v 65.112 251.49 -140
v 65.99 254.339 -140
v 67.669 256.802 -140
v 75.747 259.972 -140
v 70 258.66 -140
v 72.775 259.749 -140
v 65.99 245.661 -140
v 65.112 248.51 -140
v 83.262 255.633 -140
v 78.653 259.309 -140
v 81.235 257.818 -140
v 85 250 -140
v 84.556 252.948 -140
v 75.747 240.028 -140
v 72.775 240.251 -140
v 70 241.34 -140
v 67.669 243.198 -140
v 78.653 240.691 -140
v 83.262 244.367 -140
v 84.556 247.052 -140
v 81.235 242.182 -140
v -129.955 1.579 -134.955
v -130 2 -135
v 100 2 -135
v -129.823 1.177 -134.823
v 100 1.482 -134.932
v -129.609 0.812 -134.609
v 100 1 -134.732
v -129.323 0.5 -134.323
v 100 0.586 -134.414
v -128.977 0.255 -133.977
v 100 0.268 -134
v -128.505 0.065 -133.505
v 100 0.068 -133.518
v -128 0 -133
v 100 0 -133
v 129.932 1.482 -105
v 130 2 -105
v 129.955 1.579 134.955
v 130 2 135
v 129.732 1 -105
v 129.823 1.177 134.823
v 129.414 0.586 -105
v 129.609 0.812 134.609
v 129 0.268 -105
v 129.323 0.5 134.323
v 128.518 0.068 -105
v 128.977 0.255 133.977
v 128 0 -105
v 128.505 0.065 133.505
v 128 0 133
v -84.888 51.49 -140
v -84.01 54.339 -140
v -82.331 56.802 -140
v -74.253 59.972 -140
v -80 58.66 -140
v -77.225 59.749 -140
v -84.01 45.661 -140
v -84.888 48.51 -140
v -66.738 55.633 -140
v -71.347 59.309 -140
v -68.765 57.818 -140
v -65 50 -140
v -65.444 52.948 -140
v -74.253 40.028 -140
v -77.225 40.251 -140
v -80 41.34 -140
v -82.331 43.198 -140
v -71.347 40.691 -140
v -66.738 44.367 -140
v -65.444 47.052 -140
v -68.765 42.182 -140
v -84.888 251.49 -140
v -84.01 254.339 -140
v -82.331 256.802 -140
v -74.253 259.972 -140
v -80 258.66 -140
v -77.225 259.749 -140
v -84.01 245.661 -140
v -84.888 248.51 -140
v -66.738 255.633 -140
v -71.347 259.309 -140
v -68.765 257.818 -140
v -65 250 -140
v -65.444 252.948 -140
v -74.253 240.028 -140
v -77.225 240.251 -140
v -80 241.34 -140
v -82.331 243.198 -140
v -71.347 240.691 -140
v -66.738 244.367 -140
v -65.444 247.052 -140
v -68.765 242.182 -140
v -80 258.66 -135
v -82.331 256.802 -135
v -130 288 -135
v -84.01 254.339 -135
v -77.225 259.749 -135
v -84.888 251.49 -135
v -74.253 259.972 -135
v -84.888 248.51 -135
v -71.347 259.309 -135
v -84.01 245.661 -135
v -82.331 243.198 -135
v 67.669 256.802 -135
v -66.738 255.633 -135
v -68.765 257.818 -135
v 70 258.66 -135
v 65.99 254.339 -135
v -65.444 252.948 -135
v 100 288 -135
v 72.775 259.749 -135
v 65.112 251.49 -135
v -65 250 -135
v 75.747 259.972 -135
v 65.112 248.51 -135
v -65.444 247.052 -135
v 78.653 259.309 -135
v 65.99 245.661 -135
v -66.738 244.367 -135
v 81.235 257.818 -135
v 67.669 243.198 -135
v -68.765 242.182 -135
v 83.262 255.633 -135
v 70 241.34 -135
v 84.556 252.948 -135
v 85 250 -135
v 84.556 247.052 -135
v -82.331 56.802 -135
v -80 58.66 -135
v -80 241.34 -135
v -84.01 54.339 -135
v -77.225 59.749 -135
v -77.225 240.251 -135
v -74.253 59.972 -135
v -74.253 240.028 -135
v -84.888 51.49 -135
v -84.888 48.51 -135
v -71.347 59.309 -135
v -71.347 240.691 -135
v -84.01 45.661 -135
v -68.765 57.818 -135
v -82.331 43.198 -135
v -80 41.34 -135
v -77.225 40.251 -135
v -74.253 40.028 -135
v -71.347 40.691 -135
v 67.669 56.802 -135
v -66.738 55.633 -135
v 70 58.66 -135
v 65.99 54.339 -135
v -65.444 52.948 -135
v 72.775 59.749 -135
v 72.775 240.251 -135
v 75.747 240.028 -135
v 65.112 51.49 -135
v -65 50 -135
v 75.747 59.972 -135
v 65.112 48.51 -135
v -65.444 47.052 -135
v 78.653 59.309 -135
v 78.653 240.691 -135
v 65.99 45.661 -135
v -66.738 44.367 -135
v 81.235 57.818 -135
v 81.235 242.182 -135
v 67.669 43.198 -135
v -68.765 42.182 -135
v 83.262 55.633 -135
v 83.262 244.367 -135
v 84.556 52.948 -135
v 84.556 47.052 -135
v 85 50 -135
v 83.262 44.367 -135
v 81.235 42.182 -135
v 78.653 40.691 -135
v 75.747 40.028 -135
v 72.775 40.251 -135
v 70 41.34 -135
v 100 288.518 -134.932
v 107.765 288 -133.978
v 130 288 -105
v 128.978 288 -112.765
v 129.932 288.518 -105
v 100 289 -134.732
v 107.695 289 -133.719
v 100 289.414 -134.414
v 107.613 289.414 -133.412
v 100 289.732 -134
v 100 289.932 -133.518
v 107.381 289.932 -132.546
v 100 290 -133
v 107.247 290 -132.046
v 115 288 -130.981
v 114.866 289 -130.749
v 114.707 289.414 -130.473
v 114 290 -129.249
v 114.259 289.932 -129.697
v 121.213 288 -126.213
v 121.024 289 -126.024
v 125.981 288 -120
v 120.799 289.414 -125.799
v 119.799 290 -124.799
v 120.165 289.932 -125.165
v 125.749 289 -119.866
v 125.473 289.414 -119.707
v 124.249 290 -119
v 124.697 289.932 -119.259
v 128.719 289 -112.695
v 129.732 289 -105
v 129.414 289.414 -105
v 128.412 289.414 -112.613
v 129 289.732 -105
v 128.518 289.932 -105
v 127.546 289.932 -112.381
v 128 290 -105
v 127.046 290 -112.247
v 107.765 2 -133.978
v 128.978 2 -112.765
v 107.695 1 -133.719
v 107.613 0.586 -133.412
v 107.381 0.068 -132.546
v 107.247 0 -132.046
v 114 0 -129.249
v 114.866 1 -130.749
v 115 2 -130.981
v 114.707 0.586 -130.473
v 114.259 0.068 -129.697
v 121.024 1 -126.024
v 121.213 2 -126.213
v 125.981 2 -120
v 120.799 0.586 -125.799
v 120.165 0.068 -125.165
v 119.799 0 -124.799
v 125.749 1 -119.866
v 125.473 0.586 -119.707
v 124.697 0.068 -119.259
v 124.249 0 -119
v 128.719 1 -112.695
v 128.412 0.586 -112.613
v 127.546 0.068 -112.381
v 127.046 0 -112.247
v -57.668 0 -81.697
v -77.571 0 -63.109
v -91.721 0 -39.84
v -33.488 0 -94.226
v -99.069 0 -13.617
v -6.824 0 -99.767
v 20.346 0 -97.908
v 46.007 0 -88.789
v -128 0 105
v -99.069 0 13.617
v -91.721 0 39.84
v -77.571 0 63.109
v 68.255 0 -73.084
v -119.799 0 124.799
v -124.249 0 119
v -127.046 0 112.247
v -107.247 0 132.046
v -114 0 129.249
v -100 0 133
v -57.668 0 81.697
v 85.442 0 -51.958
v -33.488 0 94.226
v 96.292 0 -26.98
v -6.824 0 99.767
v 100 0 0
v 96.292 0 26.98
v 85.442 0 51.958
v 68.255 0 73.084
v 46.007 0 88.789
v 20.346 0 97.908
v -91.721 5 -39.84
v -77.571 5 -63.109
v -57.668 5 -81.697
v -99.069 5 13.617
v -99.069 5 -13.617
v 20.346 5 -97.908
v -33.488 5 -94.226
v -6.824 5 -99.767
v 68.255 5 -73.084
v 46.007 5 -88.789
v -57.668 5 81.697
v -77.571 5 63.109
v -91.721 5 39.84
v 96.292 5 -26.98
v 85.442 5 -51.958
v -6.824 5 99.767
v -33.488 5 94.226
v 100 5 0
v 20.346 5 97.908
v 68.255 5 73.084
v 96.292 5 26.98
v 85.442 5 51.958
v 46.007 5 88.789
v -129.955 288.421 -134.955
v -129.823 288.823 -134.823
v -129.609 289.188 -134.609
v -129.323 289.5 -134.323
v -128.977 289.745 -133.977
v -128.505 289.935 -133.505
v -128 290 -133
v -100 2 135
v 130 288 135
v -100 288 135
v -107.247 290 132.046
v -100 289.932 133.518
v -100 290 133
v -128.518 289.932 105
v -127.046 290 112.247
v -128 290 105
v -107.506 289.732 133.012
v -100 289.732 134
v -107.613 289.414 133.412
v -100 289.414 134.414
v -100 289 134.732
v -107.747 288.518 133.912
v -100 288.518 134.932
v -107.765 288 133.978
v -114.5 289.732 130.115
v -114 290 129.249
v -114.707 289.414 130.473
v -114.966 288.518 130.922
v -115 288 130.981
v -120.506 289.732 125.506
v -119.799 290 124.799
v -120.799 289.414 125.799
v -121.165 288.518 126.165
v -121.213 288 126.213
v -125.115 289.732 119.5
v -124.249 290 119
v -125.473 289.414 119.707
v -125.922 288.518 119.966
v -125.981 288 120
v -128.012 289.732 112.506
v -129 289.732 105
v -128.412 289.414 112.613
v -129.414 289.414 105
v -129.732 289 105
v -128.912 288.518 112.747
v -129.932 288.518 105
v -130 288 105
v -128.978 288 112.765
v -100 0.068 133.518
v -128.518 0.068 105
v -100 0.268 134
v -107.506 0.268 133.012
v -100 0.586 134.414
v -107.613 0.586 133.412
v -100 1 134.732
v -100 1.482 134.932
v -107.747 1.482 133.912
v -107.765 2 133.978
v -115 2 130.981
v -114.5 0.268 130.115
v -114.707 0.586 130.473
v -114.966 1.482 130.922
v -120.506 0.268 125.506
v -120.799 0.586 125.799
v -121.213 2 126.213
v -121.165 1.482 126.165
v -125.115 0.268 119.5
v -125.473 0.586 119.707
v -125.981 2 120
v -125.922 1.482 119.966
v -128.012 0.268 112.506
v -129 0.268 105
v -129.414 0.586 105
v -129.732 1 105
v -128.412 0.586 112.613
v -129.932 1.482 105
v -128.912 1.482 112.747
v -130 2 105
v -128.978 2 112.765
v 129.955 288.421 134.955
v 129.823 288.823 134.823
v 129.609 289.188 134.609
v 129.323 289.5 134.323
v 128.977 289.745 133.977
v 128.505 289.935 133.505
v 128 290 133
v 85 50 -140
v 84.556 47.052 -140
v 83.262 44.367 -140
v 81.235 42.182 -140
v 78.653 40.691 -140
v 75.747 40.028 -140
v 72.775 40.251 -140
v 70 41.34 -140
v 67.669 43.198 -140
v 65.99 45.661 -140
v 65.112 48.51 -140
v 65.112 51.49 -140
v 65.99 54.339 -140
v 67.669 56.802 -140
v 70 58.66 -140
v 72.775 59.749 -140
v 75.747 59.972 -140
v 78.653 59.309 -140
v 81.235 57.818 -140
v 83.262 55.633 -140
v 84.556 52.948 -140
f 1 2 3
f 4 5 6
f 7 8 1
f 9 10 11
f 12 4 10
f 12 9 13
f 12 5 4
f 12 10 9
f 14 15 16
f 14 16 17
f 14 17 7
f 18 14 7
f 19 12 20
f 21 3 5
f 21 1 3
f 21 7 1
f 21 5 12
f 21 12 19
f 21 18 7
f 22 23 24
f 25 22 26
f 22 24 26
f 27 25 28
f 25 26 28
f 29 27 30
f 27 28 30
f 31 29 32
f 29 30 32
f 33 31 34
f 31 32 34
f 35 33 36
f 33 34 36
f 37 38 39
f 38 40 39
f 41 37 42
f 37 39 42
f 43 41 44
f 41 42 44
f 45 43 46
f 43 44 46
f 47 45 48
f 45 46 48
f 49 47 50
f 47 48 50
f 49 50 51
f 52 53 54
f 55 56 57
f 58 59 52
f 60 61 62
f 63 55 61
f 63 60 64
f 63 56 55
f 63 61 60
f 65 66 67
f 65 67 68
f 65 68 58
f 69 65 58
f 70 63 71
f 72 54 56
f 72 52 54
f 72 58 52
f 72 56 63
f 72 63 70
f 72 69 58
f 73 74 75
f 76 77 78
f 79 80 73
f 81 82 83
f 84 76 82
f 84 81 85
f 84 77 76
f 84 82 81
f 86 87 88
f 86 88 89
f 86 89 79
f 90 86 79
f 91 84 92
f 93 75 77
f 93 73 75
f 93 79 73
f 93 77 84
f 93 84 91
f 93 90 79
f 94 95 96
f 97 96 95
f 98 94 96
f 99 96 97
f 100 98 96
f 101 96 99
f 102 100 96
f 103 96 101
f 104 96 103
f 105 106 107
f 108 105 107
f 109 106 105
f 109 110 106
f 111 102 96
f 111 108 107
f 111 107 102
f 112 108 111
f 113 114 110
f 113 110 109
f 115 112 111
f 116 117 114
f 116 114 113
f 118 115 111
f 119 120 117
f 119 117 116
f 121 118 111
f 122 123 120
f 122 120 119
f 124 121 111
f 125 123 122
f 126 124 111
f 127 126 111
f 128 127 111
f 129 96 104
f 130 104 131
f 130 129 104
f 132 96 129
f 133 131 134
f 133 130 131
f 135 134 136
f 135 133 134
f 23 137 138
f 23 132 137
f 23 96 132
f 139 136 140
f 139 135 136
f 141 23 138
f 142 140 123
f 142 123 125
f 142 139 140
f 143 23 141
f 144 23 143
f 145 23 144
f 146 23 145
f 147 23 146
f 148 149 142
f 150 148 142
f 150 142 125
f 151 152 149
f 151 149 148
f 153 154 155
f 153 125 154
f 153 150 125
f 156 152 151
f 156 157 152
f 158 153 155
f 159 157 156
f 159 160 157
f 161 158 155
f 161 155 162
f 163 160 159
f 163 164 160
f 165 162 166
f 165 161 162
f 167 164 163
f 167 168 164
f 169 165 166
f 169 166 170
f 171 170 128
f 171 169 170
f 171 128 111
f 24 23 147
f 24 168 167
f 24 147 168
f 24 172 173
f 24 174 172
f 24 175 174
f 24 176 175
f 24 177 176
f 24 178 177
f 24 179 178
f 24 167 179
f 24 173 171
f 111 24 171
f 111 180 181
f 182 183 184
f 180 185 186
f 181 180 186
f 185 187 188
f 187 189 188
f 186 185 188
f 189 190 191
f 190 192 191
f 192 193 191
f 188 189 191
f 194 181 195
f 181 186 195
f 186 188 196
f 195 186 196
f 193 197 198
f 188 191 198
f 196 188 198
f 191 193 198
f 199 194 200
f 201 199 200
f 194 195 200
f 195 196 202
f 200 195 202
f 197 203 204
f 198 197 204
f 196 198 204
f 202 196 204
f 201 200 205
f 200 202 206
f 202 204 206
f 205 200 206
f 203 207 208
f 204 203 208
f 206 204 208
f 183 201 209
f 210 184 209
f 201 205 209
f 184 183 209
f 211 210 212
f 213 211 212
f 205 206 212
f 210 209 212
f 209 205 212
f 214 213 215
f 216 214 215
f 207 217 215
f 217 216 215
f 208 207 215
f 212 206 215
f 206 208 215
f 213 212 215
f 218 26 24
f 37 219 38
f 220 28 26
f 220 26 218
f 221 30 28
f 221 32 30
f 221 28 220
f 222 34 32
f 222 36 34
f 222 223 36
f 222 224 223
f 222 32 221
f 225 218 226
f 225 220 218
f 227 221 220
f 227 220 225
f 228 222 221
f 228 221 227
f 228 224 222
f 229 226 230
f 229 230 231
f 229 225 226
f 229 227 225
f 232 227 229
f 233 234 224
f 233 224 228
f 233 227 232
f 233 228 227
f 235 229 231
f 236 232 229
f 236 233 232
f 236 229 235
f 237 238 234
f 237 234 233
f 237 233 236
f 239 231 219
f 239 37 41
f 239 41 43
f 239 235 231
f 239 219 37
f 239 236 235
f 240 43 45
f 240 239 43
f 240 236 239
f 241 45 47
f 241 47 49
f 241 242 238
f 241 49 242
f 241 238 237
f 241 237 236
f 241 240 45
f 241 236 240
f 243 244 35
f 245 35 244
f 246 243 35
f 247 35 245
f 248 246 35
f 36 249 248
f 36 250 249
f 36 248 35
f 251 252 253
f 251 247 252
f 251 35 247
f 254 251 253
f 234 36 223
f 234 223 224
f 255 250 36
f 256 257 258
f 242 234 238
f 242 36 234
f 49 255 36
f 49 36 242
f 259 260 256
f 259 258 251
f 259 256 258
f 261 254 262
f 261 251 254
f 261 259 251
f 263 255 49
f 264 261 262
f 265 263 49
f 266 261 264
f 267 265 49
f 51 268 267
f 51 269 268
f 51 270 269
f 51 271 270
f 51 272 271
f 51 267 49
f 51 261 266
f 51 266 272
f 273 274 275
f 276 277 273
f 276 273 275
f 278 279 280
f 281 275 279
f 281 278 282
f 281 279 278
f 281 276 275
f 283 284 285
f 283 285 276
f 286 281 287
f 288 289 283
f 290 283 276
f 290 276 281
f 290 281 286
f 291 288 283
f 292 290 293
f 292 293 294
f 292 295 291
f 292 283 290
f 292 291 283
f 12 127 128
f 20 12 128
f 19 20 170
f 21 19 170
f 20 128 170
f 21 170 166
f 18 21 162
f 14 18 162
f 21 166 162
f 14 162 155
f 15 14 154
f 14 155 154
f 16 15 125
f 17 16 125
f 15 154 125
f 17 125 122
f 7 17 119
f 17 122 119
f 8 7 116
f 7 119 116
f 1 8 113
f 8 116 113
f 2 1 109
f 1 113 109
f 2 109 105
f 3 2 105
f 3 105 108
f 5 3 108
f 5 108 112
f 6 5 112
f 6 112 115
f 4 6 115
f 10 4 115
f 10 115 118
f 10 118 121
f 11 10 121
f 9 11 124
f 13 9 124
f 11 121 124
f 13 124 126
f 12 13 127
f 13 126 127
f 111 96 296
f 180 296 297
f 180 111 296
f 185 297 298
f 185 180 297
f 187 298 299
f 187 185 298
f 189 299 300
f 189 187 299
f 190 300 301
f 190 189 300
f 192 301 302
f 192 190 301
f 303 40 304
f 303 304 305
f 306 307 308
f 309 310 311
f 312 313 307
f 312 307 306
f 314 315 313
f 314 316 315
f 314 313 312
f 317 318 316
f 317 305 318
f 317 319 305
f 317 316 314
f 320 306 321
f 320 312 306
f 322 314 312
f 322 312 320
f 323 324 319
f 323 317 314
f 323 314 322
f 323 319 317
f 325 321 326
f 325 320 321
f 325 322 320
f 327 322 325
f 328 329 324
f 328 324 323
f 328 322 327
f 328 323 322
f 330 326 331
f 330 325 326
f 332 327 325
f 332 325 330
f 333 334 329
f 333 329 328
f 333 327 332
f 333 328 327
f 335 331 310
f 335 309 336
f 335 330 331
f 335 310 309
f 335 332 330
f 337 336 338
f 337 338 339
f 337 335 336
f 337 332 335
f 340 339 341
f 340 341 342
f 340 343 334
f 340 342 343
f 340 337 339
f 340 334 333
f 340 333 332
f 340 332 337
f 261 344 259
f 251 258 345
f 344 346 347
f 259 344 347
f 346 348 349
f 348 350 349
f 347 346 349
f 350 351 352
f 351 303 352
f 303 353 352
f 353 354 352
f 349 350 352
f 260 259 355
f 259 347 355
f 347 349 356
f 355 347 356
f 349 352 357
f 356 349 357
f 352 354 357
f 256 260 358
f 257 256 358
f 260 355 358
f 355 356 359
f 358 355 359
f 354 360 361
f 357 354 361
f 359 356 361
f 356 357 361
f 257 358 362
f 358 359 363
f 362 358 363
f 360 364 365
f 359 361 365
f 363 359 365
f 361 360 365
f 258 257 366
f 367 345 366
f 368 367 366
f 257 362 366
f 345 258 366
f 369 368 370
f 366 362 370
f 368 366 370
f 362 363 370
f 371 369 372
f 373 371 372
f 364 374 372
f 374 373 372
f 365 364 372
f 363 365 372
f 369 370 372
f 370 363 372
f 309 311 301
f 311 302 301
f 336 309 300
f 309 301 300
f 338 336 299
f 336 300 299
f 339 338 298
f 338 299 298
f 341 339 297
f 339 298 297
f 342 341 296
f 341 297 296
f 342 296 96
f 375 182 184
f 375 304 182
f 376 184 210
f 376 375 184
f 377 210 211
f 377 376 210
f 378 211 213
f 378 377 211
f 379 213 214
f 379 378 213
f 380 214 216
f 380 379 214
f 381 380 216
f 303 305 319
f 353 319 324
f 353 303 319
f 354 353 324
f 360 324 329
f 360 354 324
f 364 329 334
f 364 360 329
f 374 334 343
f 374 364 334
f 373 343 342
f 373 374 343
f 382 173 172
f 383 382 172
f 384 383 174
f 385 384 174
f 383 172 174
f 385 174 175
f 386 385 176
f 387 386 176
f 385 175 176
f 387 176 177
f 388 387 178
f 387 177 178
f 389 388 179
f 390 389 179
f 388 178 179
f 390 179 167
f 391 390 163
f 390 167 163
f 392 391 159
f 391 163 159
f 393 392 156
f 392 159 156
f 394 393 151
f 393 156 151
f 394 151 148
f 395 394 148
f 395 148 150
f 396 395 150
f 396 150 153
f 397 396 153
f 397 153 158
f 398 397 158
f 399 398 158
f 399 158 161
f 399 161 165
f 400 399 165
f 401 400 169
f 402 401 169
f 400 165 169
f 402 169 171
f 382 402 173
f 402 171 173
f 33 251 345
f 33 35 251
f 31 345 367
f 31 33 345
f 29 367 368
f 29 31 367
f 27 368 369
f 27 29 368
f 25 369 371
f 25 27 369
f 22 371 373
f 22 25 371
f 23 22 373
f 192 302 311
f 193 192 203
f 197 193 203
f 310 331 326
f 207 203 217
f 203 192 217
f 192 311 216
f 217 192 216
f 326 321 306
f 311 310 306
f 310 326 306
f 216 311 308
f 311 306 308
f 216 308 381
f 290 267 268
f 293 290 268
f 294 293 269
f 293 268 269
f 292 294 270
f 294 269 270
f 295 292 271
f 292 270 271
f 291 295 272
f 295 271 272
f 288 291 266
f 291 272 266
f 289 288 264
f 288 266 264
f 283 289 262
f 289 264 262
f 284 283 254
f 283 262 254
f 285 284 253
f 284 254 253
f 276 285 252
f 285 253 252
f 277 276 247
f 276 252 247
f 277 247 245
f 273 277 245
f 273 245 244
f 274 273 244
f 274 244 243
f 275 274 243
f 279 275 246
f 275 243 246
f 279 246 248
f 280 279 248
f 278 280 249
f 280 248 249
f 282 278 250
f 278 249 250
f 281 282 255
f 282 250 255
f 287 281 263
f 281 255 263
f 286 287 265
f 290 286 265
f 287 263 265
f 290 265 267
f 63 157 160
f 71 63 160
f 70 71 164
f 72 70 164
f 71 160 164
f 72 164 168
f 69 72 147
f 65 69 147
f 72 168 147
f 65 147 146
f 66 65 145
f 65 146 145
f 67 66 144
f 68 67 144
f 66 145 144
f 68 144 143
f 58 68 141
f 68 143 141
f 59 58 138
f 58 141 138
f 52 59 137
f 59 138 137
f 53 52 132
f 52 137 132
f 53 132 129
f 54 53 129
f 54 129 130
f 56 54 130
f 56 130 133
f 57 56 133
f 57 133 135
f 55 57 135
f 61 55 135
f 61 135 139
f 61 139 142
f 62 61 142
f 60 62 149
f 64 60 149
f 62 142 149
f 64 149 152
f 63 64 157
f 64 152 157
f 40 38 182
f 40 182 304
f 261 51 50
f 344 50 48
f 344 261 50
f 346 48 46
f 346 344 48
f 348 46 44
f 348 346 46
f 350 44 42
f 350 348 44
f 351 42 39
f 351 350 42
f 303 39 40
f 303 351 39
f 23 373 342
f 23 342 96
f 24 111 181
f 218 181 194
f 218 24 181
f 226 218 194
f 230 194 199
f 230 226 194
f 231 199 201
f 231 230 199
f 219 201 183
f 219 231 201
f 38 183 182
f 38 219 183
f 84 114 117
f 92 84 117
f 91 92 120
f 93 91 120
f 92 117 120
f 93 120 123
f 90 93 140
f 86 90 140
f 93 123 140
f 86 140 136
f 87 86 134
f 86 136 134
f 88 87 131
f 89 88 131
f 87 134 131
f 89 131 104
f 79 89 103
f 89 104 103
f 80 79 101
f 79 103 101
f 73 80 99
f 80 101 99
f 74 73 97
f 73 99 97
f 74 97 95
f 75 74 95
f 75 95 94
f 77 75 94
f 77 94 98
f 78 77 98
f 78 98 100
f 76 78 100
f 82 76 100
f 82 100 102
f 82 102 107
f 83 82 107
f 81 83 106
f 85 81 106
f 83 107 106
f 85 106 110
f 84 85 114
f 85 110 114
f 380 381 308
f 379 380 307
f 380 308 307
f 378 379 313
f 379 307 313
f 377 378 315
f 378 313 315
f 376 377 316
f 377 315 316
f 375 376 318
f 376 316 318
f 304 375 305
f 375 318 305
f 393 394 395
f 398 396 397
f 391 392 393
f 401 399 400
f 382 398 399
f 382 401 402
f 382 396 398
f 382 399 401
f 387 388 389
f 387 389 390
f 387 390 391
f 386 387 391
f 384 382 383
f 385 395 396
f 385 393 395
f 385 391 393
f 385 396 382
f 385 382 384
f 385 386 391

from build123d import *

# Parameters (mm, degrees)
F1_DEPTH = 290
F2_R     = 10
F3_DEPTH = 5
F4_R     = 2
F5_R     = 100
F6_DEPTH = 5


with BuildPart() as f1:
    # F0 (on Front) → F1 (new body)
    with BuildSketch(Plane.XZ):
        with BuildLine():
            Line((-130, -135), (100, -135))
            ThreePointArc((100, -135), (121.213203, -126.213203), (130, -105))
            Line((130, -105), (130, 135))
            Line((130, 135), (-100, 135))
            ThreePointArc((-100, 135), (-121.213203, 126.213203), (-130, 105))
            Line((-130, 105), (-130, -135))
        make_face()
    extrude(amount=-F1_DEPTH)

    # F2 (on face) → F3 (join)
    with BuildSketch(Plane(origin=(0, 0, -135), x_dir=(1, 0, 0), z_dir=(0, 0, -1))):
        with Locations((-75, -50)):
            Circle(F2_R)
        with Locations((75, -50)):
            Circle(F2_R)
        with Locations((75, -250)):
            Circle(F2_R)
        with Locations((-75, -250)):
            Circle(F2_R)
    extrude(amount=F3_DEPTH)

    # F4
    f4_edges = [f1.edges().sort_by_distance(p)[0] for p in [
        (-15, 0, -135),
        (121.213203, 0, -126.213203),
        (130, 0, 15),
        (15, 0, 135),
        (-121.213203, 0, 126.213203),
        (-130, 0, -15),
        (-15, 290, -135),
        (121.213203, 290, -126.213203),
        (130, 290, 15),
        (15, 290, 135),
        (-121.213203, 290, 126.213203),
        (-130, 290, -15),
    ]]
    fillet(f4_edges, radius=F4_R)

    # F5 (on face) → F6 (cut)
    with BuildSketch(Plane.XZ):
        Circle(F5_R)
    extrude(amount=-F6_DEPTH, mode=Mode.SUBTRACT)


solid = f1.part
